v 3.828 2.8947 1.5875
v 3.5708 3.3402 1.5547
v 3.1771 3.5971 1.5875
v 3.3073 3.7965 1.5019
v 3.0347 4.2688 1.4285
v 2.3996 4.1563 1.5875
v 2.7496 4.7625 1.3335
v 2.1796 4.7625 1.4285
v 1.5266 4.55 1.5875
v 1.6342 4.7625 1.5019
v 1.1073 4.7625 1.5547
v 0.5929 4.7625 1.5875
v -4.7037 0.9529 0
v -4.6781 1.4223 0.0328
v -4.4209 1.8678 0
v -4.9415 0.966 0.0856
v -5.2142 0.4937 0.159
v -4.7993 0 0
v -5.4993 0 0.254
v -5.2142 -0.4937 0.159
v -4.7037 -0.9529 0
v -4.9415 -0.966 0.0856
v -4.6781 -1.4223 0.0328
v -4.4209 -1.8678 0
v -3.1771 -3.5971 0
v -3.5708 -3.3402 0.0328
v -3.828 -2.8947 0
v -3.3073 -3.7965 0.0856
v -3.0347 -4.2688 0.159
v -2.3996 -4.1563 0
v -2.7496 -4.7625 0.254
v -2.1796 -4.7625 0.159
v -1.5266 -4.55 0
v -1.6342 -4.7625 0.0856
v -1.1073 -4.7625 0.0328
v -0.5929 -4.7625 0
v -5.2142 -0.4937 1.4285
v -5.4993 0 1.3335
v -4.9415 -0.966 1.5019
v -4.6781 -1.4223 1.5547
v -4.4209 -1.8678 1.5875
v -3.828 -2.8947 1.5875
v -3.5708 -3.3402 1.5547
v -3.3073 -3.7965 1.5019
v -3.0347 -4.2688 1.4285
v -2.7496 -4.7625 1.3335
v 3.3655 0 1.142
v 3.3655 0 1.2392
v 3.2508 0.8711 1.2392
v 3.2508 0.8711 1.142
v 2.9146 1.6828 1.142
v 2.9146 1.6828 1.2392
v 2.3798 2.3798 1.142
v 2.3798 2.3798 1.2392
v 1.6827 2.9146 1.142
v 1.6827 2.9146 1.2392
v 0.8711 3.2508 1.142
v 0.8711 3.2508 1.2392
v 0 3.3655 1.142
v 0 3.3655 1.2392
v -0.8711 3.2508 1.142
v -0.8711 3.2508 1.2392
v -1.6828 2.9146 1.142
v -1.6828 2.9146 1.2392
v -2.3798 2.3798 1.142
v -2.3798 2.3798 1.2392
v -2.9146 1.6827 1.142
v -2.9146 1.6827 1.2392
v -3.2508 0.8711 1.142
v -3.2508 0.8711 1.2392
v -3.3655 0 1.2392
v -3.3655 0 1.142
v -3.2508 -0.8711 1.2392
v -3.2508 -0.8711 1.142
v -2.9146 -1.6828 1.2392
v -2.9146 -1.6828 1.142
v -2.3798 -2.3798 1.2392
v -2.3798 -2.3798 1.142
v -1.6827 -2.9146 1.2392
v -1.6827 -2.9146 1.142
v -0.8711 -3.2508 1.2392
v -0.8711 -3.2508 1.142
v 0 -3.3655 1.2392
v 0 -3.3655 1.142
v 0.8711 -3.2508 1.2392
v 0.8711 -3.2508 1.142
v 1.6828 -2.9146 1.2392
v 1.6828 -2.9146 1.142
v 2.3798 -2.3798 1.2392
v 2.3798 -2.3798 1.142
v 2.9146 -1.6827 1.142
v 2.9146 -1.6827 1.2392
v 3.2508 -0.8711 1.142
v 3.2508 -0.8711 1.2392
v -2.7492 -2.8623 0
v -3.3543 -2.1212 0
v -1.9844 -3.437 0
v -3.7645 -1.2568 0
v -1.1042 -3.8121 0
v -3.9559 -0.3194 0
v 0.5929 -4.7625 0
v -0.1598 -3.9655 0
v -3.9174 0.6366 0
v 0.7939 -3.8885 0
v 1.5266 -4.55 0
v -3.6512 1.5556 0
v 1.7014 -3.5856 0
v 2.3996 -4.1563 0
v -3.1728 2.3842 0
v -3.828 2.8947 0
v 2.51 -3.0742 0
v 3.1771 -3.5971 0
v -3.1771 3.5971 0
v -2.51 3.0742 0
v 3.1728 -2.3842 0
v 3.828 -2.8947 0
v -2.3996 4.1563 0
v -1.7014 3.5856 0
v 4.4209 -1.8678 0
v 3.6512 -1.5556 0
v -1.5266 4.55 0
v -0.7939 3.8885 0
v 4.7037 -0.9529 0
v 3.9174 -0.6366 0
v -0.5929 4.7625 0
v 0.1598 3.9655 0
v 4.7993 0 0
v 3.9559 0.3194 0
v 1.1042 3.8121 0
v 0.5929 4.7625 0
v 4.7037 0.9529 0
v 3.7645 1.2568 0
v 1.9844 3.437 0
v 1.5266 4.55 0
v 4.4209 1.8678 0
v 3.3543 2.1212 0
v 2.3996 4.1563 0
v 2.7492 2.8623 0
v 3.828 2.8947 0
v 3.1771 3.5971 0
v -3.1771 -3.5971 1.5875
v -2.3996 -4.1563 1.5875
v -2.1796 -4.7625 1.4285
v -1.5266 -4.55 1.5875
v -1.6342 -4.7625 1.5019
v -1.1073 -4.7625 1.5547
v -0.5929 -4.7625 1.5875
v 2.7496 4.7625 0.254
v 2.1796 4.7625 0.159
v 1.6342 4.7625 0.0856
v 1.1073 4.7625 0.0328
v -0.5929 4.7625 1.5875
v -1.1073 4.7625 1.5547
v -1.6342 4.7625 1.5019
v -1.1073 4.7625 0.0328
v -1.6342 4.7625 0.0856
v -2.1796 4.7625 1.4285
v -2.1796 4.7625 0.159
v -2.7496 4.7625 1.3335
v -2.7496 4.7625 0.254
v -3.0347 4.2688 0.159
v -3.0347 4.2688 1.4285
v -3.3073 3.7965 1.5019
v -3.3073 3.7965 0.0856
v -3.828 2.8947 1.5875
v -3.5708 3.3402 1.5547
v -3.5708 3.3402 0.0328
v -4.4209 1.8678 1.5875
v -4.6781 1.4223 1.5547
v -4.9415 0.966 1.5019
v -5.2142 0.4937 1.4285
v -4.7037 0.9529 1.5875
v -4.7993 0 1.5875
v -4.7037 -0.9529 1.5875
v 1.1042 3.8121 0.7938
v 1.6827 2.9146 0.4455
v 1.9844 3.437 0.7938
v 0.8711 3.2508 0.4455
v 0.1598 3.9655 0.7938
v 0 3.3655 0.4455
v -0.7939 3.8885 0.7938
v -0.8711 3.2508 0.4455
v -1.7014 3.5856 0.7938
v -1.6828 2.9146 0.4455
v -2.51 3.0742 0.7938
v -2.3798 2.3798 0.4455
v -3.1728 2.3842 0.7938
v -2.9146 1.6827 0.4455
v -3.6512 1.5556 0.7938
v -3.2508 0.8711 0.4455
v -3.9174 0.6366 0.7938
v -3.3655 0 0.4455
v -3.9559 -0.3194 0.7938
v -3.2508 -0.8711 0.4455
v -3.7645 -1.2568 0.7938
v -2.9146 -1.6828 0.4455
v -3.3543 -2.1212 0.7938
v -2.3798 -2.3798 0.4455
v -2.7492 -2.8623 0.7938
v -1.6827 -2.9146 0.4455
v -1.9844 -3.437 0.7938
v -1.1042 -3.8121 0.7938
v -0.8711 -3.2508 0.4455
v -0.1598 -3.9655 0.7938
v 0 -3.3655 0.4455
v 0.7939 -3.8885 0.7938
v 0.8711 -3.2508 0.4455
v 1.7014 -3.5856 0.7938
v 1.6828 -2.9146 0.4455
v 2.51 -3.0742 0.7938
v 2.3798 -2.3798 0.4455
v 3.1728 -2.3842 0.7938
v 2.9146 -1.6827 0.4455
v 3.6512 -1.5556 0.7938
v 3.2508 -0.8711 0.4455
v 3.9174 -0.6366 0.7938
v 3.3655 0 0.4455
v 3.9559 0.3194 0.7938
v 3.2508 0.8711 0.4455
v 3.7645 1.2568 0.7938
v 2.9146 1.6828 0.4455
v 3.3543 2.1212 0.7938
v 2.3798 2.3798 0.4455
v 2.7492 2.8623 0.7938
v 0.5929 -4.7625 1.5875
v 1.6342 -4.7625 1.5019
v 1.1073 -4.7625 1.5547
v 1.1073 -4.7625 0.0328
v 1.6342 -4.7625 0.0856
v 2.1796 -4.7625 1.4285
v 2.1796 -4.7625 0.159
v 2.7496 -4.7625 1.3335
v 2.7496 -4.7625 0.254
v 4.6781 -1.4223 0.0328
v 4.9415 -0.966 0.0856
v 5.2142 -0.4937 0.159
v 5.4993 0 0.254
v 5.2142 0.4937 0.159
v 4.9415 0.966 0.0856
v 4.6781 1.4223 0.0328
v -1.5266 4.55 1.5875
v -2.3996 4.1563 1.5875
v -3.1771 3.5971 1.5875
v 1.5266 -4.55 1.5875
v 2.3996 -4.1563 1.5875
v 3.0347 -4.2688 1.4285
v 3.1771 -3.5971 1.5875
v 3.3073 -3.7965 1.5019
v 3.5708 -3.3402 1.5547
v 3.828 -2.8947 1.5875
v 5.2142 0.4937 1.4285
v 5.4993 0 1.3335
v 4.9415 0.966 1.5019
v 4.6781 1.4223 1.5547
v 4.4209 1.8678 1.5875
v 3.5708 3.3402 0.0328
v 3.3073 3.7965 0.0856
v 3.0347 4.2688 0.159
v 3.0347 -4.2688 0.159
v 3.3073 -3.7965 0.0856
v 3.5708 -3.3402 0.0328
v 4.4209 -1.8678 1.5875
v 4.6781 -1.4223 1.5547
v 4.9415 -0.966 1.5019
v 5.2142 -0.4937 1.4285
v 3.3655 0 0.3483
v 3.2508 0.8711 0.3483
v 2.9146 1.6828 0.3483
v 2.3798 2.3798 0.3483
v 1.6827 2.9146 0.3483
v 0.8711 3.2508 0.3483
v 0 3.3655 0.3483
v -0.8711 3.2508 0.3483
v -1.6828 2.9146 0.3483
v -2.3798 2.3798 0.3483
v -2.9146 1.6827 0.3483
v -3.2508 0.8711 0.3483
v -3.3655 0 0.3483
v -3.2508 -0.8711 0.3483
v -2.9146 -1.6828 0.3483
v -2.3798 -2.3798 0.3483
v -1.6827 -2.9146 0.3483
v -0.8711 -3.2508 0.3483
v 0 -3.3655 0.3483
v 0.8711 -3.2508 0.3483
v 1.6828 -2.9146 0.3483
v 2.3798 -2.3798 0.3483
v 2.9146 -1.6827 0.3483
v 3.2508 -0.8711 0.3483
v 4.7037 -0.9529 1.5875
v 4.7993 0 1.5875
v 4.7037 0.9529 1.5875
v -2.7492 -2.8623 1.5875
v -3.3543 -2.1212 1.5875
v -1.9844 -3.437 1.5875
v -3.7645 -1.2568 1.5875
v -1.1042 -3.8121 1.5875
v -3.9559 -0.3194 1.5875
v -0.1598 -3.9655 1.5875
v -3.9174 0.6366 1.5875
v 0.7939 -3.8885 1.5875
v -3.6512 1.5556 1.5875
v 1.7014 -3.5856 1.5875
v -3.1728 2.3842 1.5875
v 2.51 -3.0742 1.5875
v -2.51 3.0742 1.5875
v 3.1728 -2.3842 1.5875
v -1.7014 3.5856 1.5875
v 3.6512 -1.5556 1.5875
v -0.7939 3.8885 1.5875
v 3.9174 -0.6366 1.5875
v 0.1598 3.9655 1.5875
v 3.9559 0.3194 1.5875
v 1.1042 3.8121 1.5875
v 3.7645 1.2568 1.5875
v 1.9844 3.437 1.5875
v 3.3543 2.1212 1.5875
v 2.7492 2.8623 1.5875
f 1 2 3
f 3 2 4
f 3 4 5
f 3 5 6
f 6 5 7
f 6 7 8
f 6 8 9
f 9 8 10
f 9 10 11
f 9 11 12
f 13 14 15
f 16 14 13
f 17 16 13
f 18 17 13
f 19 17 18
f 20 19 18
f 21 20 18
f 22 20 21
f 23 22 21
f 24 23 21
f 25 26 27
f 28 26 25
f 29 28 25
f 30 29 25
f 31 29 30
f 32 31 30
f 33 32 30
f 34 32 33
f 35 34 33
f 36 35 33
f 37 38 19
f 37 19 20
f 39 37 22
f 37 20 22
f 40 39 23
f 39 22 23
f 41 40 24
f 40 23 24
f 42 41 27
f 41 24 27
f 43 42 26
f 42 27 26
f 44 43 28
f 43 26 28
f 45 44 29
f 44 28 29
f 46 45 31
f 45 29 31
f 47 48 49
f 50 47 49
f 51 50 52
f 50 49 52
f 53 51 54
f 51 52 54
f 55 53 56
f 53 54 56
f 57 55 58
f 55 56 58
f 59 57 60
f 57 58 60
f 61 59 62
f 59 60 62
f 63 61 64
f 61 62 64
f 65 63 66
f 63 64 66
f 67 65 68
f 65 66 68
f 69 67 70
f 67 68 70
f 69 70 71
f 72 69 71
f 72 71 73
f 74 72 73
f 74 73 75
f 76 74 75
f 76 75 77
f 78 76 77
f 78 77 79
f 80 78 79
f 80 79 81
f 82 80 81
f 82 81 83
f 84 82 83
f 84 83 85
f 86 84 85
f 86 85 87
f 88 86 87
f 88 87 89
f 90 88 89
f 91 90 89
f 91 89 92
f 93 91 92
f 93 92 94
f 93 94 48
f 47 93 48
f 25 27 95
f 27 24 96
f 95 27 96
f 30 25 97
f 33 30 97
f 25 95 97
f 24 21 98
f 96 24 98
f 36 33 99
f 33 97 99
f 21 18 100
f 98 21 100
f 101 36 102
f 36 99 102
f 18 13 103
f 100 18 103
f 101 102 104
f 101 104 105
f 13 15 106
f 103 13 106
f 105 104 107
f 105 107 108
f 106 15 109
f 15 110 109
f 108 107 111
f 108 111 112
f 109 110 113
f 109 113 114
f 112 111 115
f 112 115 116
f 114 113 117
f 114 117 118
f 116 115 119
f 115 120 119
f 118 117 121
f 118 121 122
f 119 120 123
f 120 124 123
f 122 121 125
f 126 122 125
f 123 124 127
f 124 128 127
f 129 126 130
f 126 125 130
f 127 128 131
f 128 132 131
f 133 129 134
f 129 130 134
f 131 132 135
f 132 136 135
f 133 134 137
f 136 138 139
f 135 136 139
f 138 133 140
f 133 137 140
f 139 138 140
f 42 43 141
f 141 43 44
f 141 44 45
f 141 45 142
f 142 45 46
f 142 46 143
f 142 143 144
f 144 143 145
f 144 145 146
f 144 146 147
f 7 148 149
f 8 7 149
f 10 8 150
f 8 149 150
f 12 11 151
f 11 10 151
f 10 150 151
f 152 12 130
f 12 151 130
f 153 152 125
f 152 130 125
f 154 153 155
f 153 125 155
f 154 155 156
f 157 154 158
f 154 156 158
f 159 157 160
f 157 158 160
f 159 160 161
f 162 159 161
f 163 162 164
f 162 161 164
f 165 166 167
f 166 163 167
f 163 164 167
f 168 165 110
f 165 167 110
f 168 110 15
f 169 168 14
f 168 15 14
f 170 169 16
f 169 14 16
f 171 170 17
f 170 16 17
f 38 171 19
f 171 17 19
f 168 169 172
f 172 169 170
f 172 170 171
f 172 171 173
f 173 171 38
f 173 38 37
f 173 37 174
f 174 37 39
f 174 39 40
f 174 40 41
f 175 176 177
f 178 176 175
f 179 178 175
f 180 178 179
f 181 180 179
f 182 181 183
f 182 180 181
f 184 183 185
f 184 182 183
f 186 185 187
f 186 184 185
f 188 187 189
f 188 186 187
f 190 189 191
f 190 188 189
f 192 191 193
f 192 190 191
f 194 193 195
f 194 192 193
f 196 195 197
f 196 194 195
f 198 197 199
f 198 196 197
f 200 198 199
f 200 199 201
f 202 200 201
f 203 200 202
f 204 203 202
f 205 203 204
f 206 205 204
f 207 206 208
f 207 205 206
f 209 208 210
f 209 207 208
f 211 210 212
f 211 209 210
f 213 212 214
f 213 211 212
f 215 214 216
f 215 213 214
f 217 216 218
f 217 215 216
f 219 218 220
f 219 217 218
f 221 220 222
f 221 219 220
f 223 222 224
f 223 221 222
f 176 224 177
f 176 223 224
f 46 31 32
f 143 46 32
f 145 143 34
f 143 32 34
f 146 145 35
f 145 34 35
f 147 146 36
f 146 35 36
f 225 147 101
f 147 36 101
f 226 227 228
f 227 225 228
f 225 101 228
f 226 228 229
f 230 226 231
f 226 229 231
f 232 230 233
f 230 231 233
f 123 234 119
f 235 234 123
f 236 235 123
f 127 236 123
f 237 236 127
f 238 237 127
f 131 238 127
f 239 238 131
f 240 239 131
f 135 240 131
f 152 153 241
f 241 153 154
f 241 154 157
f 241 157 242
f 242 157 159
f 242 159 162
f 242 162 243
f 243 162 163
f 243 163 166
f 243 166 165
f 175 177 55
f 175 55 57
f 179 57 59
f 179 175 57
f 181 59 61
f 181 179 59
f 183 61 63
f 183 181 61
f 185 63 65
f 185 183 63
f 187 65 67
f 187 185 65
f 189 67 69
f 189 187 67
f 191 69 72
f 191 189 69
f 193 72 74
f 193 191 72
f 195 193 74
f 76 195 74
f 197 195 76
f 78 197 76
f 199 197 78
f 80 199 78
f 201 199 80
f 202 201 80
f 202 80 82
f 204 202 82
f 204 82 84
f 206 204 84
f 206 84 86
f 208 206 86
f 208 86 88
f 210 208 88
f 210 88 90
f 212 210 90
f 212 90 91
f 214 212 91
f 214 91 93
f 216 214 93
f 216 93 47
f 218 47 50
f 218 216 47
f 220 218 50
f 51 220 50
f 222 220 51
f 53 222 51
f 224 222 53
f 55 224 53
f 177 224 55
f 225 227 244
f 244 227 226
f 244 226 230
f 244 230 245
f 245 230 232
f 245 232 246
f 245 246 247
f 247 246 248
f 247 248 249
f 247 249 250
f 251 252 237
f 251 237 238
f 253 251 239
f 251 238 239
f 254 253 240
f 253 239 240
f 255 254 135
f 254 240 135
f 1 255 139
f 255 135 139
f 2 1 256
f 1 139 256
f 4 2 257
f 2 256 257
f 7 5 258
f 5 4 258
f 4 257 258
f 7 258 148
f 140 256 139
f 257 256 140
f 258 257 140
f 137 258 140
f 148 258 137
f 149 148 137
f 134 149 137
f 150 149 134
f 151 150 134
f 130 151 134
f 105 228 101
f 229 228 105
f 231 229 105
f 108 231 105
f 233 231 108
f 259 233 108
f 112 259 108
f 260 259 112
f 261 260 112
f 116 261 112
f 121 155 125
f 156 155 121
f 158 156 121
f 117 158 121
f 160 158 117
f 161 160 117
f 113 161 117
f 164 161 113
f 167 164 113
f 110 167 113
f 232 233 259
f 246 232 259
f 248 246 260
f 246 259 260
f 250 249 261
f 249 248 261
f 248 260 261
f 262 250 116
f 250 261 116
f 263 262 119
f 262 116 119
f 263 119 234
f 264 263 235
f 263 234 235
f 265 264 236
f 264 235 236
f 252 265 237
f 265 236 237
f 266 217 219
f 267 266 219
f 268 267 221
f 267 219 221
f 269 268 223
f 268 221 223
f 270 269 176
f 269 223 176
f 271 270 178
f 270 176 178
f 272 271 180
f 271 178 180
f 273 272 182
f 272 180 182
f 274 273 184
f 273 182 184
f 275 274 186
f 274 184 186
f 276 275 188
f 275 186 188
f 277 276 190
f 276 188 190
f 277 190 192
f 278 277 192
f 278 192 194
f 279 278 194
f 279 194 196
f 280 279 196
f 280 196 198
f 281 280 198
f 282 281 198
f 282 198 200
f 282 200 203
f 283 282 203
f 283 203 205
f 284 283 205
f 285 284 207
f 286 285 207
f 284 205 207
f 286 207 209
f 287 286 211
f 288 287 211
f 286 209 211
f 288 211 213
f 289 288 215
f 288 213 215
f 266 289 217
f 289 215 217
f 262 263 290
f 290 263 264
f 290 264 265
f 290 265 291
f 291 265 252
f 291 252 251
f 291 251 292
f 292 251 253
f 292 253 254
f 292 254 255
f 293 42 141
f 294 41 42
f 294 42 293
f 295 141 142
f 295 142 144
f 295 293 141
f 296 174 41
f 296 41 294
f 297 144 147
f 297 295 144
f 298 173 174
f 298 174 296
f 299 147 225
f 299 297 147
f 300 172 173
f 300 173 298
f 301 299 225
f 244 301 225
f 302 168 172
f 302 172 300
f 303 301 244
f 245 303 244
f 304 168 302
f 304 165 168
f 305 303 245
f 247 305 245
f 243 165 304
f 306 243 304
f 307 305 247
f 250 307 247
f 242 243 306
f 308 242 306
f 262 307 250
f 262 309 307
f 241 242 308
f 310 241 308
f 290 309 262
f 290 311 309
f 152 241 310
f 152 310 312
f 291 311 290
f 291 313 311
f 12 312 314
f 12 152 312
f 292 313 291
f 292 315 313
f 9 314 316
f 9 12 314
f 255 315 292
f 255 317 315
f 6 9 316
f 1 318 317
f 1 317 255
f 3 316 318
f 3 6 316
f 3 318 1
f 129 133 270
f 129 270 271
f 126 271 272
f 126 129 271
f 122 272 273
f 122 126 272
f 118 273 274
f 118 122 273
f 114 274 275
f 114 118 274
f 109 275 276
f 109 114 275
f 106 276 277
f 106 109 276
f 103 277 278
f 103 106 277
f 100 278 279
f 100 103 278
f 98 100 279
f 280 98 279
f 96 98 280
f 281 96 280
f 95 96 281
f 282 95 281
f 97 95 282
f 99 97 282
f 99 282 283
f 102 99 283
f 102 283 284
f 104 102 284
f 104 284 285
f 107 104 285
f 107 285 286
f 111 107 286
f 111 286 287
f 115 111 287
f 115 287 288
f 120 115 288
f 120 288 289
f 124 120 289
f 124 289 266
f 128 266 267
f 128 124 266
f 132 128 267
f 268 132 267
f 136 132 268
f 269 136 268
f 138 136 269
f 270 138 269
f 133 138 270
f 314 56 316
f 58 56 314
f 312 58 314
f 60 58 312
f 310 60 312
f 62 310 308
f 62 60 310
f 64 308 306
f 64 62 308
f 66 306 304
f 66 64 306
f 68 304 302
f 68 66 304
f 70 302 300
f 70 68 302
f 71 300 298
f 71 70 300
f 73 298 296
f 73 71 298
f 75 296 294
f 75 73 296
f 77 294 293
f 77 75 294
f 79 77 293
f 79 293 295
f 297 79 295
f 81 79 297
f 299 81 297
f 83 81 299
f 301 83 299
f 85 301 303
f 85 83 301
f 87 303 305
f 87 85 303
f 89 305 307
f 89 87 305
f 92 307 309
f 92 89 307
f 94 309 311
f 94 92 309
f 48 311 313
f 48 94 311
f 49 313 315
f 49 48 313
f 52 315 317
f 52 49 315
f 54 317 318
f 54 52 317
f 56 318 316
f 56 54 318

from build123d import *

# Parameters (mm, degrees)
BASE_EXTRUDE_DEPTH = 1.5875
SKETCH2_R          = 3.3655
CUT_EXTRUDE1_DEPTH = 2.5875
LPATTERN1_COUNT    = 3
LPATTERN1_PITCH    = 0.79375


with BuildPart() as part:
    # Sketch1 → Base-Extrude (new body)
    with BuildSketch(Plane.XY):
        Polygon((5.499261314, 0), (2.749630657, 4.7625), (-2.749630657, 4.7625), (-5.499261314, 0), (-2.749630657, -4.7625), (2.749630657, -4.7625), align=None)
    extrude(amount=BASE_EXTRUDE_DEPTH)

    # Sketch2 → Cut-Extrude1 (cut, through all)
    with BuildSketch(Plane.XY.offset(1.5875)):
        Circle(SKETCH2_R)
    extrude(amount=-CUT_EXTRUDE1_DEPTH, mode=Mode.SUBTRACT)

    # Sketch3 → Cut-Revolve1 (revolve, cut)
    with BuildSketch(Plane(origin=(0, 0, 0), x_dir=(0, 0, 1), z_dir=(-0.866025404, 0.5, 0))):
        Polygon((1.3335, 5.499261314), (1.5875, 5.499261314), (1.5875, 4.799261314), align=None)
    cut_revolve1 = revolve(axis=Axis((0, 0, 0), (0, 0, 1)), mode=Mode.SUBTRACT)

    # Mirror1: Cut-Revolve1 across plane
    add(cut_revolve1.mirror(Plane.XY.offset(0.79375)), mode=Mode.SUBTRACT)

    # Sketch4 → Cut-Revolve2 (revolve, cut)
    with BuildSketch(Plane(origin=(0, 0, 0), x_dir=(0, 0, 1), z_dir=(-0.866025404, 0.5, 0))):
        Polygon((1.5875, 3.96875), (1.190625, 3.281342336), (1.984375, 3.281342336), align=None)
    cut_revolve2 = revolve(axis=Axis((0, 0, 0), (0, 0, 1)), mode=Mode.SUBTRACT)

    # LPattern1: Cut-Revolve2 ×3
    with Locations(*[(0, 0, -i * LPATTERN1_PITCH) for i in range(1, LPATTERN1_COUNT)]):
        add(cut_revolve2, mode=Mode.SUBTRACT)


solid = part.part
